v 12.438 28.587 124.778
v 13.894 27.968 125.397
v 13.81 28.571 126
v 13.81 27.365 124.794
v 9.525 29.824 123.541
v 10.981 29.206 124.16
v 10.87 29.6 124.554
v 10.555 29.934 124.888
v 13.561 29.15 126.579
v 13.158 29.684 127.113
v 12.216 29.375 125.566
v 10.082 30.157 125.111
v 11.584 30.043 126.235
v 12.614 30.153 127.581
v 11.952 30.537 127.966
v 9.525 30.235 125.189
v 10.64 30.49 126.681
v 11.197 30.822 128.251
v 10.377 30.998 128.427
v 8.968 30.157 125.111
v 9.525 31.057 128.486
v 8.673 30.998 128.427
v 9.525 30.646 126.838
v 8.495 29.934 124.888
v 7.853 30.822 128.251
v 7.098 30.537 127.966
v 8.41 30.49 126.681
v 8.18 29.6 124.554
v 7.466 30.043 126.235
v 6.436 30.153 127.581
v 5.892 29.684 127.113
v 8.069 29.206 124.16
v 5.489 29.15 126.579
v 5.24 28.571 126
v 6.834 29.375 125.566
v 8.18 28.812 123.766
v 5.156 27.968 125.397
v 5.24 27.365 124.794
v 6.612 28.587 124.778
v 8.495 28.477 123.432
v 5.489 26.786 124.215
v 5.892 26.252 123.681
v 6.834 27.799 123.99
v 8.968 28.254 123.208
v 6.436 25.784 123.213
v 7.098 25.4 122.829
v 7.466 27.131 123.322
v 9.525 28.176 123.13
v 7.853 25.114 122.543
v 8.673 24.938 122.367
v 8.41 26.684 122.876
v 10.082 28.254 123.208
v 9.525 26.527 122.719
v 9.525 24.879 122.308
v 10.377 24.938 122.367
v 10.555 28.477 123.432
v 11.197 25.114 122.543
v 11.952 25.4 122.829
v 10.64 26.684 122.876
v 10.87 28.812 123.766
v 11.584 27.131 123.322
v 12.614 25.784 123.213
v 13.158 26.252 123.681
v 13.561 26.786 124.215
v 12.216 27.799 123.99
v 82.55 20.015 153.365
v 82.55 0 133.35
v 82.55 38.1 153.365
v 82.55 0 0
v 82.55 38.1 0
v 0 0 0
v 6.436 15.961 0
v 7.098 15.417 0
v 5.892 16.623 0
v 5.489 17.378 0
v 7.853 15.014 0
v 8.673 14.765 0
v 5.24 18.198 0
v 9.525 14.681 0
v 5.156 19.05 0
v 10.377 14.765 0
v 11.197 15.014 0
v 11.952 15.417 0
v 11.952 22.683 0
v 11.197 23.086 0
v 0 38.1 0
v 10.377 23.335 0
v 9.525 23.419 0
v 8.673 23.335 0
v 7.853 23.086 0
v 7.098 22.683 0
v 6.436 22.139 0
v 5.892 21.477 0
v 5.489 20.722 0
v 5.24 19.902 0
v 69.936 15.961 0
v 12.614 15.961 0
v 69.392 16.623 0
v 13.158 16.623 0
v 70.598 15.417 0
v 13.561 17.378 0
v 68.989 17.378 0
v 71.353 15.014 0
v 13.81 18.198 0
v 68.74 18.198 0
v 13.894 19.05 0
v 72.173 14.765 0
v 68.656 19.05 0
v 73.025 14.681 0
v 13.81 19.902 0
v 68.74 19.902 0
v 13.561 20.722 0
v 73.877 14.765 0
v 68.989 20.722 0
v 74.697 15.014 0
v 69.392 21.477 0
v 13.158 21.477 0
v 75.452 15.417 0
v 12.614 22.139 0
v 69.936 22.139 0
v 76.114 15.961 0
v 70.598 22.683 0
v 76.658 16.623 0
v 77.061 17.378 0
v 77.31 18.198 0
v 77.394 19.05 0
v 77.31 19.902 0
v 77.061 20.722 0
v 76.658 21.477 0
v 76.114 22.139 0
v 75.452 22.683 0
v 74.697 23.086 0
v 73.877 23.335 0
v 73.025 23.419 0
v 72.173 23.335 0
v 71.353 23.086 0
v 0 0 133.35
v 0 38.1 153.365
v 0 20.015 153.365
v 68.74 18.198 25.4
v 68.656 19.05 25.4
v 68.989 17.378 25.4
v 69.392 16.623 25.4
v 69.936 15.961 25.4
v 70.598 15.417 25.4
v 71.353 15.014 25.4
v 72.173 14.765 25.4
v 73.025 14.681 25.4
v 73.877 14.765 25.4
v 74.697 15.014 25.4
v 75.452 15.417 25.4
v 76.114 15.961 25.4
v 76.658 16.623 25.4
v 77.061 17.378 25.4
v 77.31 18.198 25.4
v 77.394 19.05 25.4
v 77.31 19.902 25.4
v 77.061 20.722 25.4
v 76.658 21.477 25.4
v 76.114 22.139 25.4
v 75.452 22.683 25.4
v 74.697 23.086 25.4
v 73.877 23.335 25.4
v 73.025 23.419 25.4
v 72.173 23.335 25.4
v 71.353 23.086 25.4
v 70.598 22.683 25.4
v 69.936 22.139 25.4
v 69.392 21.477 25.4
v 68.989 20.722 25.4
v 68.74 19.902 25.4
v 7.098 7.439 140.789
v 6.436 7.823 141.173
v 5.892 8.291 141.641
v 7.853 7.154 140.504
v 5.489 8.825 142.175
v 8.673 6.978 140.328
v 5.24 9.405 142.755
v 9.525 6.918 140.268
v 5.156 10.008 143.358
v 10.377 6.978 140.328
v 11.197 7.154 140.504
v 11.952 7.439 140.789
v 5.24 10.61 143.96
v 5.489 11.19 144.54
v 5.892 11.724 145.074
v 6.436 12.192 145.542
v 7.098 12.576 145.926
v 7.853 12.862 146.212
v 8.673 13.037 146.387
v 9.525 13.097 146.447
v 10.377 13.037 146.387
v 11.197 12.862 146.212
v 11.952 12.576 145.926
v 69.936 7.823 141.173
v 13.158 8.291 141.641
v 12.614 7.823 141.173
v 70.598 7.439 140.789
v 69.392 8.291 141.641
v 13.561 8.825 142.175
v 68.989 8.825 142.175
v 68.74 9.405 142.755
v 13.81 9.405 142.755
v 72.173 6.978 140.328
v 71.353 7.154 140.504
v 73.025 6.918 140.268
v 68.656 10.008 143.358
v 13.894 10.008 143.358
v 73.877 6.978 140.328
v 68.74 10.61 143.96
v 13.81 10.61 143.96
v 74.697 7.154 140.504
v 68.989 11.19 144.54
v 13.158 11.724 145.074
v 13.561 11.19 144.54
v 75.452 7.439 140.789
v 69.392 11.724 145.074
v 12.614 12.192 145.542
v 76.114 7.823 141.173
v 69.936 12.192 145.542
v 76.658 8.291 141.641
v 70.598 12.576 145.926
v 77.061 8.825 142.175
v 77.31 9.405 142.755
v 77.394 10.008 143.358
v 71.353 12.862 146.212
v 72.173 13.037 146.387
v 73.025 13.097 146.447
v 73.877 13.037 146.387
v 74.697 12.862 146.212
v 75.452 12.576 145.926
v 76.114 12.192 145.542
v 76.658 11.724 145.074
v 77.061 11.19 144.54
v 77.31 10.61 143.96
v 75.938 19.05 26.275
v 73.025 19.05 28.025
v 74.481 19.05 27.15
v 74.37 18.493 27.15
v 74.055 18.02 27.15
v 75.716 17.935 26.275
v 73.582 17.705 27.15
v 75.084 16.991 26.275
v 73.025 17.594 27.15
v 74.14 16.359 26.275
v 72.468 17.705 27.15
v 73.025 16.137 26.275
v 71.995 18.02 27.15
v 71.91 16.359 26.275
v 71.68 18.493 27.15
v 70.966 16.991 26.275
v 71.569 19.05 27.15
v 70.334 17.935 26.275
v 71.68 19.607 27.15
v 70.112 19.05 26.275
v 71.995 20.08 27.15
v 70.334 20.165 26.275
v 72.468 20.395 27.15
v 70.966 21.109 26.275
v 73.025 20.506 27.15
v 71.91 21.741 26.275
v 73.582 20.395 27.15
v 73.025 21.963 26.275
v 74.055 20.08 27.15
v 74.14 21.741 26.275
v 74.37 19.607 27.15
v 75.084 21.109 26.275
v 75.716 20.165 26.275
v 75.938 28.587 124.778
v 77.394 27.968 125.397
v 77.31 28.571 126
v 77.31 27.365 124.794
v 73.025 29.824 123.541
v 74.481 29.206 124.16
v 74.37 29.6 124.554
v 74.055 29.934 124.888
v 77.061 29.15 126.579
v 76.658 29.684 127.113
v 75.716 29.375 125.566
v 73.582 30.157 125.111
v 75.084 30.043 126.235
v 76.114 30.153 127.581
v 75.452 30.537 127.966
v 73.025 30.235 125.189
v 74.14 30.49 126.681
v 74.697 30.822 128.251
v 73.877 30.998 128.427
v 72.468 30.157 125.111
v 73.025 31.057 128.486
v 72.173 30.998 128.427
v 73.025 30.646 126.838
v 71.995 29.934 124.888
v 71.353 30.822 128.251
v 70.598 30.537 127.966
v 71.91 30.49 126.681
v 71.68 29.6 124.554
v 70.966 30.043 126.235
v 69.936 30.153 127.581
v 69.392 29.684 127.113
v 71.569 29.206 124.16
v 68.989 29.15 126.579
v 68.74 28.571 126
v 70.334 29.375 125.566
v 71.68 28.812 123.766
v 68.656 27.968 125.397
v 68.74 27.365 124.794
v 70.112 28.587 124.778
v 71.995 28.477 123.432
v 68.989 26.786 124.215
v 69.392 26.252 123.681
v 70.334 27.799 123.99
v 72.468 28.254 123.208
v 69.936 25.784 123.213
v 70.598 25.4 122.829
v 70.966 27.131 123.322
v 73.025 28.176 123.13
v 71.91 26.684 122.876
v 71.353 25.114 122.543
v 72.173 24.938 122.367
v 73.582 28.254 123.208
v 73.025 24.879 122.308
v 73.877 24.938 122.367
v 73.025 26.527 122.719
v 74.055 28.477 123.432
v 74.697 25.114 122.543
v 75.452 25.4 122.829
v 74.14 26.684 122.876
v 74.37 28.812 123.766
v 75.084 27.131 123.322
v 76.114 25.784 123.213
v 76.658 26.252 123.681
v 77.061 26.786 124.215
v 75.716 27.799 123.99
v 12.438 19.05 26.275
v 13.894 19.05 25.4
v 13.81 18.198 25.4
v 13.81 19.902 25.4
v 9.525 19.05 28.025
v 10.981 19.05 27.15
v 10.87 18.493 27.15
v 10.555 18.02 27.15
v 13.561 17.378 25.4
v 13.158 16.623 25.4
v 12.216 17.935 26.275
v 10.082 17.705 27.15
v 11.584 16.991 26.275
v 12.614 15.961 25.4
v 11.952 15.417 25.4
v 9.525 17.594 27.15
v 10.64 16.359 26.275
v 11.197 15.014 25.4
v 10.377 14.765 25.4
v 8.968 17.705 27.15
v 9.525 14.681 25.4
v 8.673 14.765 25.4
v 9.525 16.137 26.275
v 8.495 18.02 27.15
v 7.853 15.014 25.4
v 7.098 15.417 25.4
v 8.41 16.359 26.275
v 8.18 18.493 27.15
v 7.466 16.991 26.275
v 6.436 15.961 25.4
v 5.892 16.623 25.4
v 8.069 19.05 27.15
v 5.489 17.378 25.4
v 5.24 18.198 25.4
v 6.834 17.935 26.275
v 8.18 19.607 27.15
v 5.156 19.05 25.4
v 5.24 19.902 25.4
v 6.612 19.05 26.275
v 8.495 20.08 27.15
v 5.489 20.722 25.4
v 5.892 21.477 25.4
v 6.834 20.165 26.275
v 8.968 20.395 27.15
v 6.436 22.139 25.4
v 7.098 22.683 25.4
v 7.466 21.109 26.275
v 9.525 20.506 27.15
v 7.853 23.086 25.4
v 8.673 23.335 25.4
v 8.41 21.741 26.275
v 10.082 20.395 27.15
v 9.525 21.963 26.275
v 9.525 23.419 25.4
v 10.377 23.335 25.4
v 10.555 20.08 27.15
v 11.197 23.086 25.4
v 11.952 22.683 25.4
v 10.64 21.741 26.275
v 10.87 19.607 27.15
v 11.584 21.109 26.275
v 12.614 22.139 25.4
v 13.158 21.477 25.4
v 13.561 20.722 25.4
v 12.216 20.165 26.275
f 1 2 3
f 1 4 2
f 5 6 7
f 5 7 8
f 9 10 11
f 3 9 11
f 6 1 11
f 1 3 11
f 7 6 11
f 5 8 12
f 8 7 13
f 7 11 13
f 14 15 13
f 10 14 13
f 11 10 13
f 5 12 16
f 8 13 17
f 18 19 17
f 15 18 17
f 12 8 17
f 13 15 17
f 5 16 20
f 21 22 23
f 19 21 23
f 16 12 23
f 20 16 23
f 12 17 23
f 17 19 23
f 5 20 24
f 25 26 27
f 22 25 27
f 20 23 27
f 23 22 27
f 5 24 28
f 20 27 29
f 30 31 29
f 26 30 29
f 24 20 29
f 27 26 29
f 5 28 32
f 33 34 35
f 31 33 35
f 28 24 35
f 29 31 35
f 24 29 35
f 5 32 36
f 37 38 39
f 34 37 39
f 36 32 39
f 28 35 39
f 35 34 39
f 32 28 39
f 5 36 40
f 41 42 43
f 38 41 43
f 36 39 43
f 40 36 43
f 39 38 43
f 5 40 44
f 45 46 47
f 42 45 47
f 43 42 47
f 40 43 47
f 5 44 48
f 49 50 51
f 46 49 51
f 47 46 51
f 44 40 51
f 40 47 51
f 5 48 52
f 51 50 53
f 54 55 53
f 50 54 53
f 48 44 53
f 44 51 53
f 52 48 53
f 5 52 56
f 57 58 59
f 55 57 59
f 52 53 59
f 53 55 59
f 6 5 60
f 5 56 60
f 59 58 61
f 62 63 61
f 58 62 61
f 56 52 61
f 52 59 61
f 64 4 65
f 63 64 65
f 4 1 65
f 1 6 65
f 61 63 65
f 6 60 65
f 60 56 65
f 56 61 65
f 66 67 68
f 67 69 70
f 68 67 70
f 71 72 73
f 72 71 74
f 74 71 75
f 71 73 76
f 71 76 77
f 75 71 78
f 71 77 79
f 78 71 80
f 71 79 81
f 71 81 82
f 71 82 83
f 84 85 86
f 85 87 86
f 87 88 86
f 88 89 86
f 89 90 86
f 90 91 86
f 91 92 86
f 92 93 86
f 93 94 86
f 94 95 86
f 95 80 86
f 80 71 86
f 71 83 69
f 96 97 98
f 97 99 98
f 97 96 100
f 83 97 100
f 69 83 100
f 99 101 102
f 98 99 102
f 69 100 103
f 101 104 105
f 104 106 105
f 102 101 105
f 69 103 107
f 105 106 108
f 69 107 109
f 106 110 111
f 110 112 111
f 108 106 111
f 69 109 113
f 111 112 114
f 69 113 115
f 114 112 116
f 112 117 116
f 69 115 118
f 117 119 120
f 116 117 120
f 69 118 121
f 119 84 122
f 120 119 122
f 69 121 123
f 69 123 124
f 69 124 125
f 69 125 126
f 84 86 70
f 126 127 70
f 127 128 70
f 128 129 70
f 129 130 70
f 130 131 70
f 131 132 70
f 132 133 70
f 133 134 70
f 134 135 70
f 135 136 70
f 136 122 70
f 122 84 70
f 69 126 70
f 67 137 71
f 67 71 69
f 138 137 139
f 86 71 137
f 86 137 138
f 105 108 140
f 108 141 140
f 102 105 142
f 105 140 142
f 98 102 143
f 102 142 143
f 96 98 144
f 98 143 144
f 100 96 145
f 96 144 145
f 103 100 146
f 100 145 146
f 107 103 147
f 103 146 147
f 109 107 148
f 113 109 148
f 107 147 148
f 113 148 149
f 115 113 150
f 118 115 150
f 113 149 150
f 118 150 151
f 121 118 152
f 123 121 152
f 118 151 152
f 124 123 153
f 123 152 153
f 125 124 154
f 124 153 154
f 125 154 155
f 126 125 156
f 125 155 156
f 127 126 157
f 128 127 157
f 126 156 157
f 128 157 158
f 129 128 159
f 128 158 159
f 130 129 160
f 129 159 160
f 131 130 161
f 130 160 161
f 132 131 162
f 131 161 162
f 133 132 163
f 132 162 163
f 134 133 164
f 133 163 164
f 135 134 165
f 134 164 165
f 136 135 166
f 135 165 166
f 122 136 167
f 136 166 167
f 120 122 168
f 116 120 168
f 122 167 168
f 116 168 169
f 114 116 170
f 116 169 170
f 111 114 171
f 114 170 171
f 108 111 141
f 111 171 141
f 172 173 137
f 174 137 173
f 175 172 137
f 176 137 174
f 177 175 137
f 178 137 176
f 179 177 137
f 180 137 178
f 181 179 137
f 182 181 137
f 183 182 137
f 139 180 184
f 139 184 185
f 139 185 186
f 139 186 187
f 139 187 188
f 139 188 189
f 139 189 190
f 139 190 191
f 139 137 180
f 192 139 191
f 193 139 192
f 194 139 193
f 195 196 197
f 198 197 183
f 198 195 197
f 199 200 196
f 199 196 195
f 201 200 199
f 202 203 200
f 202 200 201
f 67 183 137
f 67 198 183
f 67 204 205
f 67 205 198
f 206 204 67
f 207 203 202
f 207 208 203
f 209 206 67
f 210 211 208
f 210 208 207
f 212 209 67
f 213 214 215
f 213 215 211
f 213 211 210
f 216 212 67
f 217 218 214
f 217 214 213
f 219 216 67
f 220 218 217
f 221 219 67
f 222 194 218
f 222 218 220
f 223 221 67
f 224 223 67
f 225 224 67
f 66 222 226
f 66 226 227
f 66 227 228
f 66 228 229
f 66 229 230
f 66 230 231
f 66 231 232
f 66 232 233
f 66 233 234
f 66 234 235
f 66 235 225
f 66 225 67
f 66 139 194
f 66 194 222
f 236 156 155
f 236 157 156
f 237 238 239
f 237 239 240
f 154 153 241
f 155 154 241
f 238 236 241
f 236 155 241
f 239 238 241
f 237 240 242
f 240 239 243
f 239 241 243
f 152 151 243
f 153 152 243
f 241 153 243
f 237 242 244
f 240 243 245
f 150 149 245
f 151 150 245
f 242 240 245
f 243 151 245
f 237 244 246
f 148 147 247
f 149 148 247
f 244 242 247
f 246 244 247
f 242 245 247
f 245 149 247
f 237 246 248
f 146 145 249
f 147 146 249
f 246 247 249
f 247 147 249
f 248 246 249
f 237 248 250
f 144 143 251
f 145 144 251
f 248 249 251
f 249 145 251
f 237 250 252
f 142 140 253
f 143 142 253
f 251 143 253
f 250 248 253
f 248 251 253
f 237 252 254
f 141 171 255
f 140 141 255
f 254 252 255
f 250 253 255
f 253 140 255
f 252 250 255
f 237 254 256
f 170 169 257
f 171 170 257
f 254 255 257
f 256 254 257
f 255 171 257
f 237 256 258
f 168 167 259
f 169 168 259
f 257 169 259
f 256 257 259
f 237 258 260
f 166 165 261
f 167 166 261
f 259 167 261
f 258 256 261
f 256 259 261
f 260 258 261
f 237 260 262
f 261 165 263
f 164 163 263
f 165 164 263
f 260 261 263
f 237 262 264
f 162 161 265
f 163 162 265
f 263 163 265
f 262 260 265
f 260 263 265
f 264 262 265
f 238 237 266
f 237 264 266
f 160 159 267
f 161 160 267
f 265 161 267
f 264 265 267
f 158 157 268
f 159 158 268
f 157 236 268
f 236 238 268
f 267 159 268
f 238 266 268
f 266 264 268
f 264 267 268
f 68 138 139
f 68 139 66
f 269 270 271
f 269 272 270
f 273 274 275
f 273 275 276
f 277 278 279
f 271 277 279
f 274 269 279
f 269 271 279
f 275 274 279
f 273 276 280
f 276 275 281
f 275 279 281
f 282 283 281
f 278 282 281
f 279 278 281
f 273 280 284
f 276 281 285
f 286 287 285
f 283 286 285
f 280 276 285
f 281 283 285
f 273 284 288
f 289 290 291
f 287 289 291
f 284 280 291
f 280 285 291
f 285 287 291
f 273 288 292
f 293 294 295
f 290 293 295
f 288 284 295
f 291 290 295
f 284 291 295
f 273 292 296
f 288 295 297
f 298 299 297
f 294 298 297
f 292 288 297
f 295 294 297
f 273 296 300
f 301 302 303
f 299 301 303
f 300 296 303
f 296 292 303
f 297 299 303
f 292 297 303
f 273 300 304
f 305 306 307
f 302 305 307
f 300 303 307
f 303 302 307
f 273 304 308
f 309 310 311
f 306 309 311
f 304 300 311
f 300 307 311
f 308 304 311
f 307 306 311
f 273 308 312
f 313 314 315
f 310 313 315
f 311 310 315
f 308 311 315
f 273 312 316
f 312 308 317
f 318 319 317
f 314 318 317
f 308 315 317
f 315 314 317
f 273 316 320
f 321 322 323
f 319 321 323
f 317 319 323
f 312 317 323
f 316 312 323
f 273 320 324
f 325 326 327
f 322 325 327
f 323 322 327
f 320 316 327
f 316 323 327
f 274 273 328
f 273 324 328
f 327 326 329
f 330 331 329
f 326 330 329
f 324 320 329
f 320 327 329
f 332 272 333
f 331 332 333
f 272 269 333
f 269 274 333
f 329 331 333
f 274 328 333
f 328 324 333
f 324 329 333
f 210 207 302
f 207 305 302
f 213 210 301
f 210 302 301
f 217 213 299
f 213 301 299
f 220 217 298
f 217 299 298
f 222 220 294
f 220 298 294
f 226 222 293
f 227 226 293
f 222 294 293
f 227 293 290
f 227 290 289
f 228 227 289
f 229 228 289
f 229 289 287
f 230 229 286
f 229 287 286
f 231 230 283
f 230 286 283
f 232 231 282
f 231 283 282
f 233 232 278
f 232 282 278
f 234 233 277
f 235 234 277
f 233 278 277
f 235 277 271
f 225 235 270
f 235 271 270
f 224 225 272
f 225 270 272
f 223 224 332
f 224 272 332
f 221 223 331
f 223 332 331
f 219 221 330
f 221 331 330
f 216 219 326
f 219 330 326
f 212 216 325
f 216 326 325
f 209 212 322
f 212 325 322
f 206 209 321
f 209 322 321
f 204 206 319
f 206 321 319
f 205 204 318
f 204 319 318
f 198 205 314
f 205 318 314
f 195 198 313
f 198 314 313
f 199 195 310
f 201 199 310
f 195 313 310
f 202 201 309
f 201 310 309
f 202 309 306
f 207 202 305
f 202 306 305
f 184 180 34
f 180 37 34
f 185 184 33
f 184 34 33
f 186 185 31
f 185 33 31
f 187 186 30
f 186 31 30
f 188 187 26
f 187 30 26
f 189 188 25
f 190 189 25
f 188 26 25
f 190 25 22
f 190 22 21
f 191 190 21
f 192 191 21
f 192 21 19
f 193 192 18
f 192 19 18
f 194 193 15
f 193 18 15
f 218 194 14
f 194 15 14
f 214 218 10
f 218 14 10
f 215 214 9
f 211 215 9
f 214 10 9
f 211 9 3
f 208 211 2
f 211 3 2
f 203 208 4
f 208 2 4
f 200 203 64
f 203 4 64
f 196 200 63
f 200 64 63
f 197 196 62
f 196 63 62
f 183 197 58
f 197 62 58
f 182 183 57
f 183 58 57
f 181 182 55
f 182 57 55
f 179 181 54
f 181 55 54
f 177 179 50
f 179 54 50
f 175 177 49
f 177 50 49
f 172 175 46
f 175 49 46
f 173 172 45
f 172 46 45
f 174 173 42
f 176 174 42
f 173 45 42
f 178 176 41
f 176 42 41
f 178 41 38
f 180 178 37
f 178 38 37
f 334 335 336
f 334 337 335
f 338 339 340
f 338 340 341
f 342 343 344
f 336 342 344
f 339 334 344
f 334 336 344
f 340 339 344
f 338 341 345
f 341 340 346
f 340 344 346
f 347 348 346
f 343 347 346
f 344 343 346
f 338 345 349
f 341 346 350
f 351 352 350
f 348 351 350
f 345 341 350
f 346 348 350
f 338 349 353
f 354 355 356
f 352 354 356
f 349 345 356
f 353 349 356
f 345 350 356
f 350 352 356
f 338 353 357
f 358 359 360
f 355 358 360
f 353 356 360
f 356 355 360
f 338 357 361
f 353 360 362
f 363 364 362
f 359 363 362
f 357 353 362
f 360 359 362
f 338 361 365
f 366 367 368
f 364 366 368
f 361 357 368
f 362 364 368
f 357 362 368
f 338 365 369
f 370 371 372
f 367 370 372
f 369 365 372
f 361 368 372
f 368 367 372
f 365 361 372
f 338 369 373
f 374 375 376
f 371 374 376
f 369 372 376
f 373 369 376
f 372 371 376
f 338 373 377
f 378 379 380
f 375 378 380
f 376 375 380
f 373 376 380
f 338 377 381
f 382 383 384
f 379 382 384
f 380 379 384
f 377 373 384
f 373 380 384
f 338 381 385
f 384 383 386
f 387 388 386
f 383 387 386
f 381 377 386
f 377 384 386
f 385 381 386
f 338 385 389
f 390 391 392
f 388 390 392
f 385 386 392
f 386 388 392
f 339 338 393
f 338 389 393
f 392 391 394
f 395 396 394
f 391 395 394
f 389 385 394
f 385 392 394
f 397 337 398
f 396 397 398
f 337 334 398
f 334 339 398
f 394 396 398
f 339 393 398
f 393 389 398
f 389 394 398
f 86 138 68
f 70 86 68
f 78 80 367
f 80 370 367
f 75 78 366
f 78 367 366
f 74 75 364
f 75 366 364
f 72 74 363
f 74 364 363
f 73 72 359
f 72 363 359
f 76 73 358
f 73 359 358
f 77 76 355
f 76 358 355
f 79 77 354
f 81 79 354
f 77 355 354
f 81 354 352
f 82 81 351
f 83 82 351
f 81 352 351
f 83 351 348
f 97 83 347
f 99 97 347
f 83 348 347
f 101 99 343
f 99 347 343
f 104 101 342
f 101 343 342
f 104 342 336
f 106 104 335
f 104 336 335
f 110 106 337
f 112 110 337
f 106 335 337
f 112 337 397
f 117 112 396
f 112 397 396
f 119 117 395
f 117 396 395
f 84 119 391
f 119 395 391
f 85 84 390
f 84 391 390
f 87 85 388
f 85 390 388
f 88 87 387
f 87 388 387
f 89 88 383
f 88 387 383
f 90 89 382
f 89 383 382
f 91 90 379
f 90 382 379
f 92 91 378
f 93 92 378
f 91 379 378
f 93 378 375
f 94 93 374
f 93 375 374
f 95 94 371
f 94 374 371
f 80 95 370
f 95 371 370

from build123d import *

# Parameters (mm, degrees)
F0_W     = 82.55
F0_H     = 38.1
F1_DEPTH = 153.3652
F2_SIZE2 = 20.0152
F2_SIZE  = 20.0152
F4_D     = 8.7376
F4_DEPTH = 25.4
F4_TIP   = 2.6250398724
F6_D     = 8.7376
F6_DEPTH = 25.4
F6_TIP   = 2.6250398724


with BuildPart() as f1:
    # F0 (on Top) → F1 (new body)
    with BuildSketch(Plane.XY):
        with Locations((41.275, 19.05)):
            Rectangle(F0_W, F0_H)
    extrude(amount=F1_DEPTH)

    # F2
    f2_edges = [f1.edges().sort_by_distance(p)[0] for p in [
        (41.275, 0, 153.3652),
    ]]
    chamfer(f2_edges, length=F2_SIZE, length2=F2_SIZE2)

    # F4
    with Locations(Plane(origin=(0, -66.675, 66.675), x_dir=(1, 0, 0), z_dir=(0, -0.7071067812, 0.7071067812))):
        with Locations((9.525, 108.4455765648), (73.025, 108.4455765648)):
            Hole(F4_D / 2, depth=F4_DEPTH)
            with Locations((0, 0, -(F4_DEPTH + F4_TIP / 2))):  # 118° drill point
                Cone(0, F4_D / 2, F4_TIP, mode=Mode.SUBTRACT)

    # F6
    with Locations(Plane(origin=(0, 0, 0), x_dir=(1, 0, 0), z_dir=(0, 0, -1))):
        with Locations((9.525, -19.05), (73.025, -19.05)):
            Hole(F6_D / 2, depth=F6_DEPTH)
            with Locations((0, 0, -(F6_DEPTH + F6_TIP / 2))):  # 118° drill point
                Cone(0, F6_D / 2, F6_TIP, mode=Mode.SUBTRACT)


solid = f1.part
